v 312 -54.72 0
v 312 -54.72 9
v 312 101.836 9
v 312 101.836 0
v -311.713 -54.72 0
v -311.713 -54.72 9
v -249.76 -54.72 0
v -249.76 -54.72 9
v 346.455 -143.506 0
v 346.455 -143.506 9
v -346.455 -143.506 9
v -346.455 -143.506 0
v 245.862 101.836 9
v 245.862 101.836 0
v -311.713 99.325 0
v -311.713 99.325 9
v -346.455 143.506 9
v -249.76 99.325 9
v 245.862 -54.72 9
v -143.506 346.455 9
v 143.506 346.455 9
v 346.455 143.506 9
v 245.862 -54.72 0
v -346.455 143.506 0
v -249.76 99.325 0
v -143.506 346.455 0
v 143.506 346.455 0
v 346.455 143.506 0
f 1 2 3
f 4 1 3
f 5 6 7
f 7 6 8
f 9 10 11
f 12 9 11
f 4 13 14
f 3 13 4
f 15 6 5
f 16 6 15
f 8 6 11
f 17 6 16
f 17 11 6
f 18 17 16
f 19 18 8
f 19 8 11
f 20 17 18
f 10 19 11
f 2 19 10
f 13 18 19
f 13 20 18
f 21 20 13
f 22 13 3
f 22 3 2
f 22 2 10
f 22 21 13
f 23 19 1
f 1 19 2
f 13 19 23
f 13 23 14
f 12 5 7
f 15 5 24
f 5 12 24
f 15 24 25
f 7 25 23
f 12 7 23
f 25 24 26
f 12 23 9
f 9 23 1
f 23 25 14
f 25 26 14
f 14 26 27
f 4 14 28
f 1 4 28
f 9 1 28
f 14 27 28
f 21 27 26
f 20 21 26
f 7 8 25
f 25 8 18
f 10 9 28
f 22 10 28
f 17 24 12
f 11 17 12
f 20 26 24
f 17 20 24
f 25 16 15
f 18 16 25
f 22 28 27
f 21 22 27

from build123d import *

# Parameters (mm, degrees)
F1_DEPTH = 9
F3_DEPTH = 9.001
F4_W     = 61.952739
F4_H     = 154.044632
F5_DEPTH = 9.001
F4_W_2   = 66.138744
F4_H_2   = 156.55623
F6_DEPTH = 9.001


with BuildPart() as f1:
    # F0 (on Top) → F1 (new body)
    with BuildSketch(Plane.XY):
        Polygon((143.506287, 346.454825), (-143.506287, 346.454825), (-346.454825, 143.506287), (-346.454825, -143.506287), (-143.506287, -346.454825), (143.506287, -346.454825), (346.454825, -143.506287), (346.454825, 143.506287), align=None)
    extrude(amount=F1_DEPTH)

    # F2 (on face) → F3 (cut, through all)
    with BuildSketch(Plane.XY.offset(9)):
        Polygon((346.454825, -143.506287), (-346.454825, -143.506287), (-143.506287, -346.454825), (143.506287, -346.454825), align=None)
    extrude(amount=-F3_DEPTH, mode=Mode.SUBTRACT)

    # F4 (on face) → F5 (cut, through all)
    with BuildSketch(Plane.XY.offset(9)):
        with Locations((-280.736581, 22.30238)):
            Rectangle(F4_W, F4_H)
    extrude(amount=-F5_DEPTH, mode=Mode.SUBTRACT)

    # F4 (on face) → F6 (cut, through all)
    with BuildSketch(Plane.XY.offset(9)):
        with Locations((278.931022, 23.558179)):
            Rectangle(F4_W_2, F4_H_2)
    extrude(amount=-F6_DEPTH, mode=Mode.SUBTRACT)


solid = f1.part
